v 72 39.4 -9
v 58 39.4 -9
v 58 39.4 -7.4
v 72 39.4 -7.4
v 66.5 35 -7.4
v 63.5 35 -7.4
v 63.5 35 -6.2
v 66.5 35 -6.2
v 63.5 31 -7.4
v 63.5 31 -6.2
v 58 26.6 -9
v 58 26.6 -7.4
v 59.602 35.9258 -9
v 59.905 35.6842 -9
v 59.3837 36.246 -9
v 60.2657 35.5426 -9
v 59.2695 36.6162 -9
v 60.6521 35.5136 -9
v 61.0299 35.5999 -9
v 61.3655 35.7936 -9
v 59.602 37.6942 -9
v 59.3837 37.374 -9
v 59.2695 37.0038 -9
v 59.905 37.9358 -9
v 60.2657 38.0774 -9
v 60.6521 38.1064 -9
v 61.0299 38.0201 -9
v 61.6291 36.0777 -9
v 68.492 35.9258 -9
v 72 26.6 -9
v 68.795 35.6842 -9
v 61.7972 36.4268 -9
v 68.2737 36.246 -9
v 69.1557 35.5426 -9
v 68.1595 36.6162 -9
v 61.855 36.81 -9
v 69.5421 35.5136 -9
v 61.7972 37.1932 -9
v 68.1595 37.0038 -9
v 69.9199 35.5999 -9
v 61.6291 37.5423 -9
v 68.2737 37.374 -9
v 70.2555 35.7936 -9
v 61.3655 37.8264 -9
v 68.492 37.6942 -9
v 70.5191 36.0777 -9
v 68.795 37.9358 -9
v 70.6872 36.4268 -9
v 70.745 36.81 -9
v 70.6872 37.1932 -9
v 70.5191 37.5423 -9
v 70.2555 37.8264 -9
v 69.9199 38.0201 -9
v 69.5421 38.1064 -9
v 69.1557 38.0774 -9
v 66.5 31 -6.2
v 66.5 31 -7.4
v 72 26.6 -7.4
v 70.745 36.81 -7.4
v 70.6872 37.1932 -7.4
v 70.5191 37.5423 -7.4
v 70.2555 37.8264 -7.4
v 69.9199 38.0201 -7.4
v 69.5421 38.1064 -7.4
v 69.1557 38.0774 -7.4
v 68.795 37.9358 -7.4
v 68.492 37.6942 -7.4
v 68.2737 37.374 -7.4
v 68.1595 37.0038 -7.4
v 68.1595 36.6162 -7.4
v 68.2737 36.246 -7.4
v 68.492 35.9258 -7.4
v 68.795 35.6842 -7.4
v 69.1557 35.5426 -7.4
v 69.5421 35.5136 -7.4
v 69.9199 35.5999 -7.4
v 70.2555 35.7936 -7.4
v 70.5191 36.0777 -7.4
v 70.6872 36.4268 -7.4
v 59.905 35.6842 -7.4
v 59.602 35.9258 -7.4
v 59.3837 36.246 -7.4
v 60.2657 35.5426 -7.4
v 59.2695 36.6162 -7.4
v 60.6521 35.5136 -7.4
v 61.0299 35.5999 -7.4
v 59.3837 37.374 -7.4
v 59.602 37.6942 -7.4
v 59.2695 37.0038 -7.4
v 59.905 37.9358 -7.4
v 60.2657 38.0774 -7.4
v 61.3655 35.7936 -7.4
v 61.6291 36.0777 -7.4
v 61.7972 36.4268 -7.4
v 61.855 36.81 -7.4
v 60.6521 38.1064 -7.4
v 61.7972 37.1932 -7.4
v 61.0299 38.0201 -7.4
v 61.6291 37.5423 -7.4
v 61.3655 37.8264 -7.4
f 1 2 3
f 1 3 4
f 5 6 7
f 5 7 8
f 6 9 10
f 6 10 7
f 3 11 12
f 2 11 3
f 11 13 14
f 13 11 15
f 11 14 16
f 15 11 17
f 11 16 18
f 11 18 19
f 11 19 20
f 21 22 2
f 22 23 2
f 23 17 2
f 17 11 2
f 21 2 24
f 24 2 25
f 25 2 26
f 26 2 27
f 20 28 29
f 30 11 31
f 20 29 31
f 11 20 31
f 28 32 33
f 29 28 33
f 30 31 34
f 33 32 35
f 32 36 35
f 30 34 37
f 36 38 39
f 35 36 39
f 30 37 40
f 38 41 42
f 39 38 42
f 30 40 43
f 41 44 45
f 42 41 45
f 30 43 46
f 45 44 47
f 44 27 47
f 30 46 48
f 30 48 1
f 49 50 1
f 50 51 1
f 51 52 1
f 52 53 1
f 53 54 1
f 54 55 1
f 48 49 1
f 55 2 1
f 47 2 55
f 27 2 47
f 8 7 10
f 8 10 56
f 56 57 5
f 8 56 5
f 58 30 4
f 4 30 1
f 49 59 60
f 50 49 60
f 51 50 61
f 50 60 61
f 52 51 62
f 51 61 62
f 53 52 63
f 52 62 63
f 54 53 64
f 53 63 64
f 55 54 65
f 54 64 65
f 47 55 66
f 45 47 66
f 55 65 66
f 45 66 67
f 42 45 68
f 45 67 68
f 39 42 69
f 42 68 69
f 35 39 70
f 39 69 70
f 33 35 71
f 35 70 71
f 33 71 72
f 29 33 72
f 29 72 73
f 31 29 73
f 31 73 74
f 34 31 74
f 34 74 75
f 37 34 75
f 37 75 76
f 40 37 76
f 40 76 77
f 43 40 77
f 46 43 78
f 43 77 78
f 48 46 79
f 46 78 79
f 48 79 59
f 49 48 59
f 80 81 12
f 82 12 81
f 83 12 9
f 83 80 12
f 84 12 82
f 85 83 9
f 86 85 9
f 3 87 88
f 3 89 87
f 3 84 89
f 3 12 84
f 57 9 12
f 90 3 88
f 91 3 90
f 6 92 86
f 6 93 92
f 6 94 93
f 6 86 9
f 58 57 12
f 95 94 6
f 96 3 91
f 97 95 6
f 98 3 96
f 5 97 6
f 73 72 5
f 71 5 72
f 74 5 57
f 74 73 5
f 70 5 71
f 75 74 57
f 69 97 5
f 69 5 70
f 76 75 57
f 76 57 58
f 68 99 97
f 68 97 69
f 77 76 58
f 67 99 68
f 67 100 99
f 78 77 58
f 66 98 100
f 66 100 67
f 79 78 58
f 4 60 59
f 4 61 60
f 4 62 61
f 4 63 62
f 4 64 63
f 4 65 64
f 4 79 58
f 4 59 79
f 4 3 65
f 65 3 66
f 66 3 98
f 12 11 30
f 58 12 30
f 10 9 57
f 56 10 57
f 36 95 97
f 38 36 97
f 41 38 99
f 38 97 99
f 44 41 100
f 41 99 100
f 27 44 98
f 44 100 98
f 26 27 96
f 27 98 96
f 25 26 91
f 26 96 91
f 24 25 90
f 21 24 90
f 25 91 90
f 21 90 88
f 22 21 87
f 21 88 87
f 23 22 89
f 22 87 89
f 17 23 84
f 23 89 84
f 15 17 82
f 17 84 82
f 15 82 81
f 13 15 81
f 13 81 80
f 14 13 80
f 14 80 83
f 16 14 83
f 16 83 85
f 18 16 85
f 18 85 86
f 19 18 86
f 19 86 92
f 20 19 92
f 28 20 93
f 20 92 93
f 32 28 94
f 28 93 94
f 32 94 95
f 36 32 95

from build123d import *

# Parameters (mm, degrees)
V10_MIC_14X12P8_PCB_START               = -9
SKETCH_4_W                              = 14
SKETCH_4_H                              = 12.8
V10_MIC_14X12P8_PCB_DEPTH               = 1.6
V10_MIC_SOUND_PACKAGE_FACING_LID_START  = -7.4
SKETCH_5_W                              = 3
SKETCH_5_H                              = 4
V10_MIC_SOUND_PACKAGE_FACING_LID_DEPTH  = 1.2
SKETCH_6_R                              = 1.3
V10_MIC_REFERENCE_HOLES_PITCH8P89_DEPTH = 1.6


with BuildPart() as part:
    # 草图4 → V10_MIC_14x12p8_pcb (new body)
    with BuildSketch(Plane.XY.offset(V10_MIC_14X12P8_PCB_START)):
        with Locations((65, 33)):
            Rectangle(SKETCH_4_W, SKETCH_4_H)
    extrude(amount=V10_MIC_14X12P8_PCB_DEPTH)

    # 草图5 → V10_MIC_sound_package_facing_lid (add)
    with BuildSketch(Plane.XY.offset(V10_MIC_SOUND_PACKAGE_FACING_LID_START)):
        with Locations((65, 33)):
            Rectangle(SKETCH_5_W, SKETCH_5_H)
    extrude(amount=V10_MIC_SOUND_PACKAGE_FACING_LID_DEPTH)

    # 草图6 → V10_MIC_reference_holes_pitch8p89 (cut)
    with BuildSketch(Plane.XY.offset(-7.4)):
        with Locations((60.555, 36.81)):
            Circle(SKETCH_6_R)
        with Locations((69.445, 36.81)):
            Circle(SKETCH_6_R)
    extrude(amount=-V10_MIC_REFERENCE_HOLES_PITCH8P89_DEPTH, mode=Mode.SUBTRACT)


solid = part.part
